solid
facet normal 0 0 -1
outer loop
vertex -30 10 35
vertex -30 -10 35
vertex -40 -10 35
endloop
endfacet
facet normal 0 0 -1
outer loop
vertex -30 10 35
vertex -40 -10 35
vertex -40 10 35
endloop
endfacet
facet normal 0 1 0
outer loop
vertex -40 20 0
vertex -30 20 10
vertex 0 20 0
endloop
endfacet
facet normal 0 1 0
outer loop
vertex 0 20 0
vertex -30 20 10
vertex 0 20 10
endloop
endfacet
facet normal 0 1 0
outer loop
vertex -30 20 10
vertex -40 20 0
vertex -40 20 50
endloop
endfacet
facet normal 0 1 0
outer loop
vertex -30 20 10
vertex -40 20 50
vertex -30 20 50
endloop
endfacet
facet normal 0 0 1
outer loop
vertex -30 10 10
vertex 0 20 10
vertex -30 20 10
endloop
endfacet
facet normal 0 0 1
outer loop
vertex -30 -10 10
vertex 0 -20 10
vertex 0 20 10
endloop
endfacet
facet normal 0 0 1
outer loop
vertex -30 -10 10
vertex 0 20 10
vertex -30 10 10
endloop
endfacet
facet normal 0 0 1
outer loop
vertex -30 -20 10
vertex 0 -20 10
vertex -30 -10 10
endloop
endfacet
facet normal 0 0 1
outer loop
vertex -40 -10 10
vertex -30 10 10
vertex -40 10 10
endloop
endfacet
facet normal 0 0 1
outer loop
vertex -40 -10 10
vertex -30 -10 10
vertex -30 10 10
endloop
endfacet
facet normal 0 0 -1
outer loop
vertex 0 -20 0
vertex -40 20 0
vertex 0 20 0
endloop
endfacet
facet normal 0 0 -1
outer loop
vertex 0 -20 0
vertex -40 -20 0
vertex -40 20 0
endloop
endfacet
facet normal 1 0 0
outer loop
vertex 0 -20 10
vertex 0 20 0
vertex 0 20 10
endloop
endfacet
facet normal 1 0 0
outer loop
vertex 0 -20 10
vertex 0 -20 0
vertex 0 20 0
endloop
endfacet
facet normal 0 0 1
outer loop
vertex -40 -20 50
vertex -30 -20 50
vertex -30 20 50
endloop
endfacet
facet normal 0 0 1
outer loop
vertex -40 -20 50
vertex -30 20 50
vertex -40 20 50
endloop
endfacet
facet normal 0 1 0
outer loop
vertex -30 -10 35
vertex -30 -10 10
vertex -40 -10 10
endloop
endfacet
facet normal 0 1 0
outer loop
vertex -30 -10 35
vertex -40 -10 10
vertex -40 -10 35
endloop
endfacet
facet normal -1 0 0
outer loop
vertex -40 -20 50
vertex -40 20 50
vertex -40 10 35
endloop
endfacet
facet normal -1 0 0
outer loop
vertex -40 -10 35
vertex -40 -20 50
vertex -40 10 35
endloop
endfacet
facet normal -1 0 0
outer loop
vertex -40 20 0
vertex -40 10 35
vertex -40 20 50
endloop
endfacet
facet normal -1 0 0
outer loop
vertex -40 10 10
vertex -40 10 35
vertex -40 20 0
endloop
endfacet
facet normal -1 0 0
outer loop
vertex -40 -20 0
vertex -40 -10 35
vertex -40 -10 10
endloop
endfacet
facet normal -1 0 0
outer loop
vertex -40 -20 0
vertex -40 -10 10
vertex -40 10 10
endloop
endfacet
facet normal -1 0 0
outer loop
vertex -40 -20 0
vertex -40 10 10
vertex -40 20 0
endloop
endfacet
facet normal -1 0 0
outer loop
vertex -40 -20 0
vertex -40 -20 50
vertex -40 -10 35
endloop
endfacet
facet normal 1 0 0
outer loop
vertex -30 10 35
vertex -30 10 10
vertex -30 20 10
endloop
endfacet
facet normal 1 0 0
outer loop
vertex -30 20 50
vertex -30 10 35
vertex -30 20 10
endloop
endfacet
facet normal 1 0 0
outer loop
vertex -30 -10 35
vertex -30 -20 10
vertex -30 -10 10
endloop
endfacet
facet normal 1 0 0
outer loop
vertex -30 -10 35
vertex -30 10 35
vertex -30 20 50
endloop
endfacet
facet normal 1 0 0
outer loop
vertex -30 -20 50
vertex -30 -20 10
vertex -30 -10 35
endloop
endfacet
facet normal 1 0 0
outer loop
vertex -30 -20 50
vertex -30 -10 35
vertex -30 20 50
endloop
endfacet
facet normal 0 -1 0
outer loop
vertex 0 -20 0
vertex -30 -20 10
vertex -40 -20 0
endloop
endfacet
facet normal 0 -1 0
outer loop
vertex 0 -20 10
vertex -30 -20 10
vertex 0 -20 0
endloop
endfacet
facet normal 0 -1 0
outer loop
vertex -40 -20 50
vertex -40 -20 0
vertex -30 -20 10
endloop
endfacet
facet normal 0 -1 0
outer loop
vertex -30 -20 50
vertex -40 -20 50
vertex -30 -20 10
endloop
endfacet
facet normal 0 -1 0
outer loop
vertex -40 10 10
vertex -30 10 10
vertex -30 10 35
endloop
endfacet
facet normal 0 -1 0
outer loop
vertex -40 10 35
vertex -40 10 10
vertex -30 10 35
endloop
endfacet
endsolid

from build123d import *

# Parameters (mm, degrees)
F1_DEPTH = 20
F2_W     = 20
F2_H     = 25
F3_DEPTH = 25.4


with BuildPart() as f1:
    # F0 (on Front) → F1 (new body, symmetric)
    with BuildSketch(Plane.XZ):
        Polygon((0, 0), (0, 10), (-30, 10), (-30, 50), (-40, 50), (-40, 0), align=None)
    extrude(amount=F1_DEPTH, both=True)

    # F2 (on face) → F3 (cut)
    with BuildSketch(Plane.YZ.offset(-30)):
        with Locations((0, 22.5)):
            Rectangle(F2_W, F2_H)
    extrude(amount=-F3_DEPTH, mode=Mode.SUBTRACT)


solid = f1.part
